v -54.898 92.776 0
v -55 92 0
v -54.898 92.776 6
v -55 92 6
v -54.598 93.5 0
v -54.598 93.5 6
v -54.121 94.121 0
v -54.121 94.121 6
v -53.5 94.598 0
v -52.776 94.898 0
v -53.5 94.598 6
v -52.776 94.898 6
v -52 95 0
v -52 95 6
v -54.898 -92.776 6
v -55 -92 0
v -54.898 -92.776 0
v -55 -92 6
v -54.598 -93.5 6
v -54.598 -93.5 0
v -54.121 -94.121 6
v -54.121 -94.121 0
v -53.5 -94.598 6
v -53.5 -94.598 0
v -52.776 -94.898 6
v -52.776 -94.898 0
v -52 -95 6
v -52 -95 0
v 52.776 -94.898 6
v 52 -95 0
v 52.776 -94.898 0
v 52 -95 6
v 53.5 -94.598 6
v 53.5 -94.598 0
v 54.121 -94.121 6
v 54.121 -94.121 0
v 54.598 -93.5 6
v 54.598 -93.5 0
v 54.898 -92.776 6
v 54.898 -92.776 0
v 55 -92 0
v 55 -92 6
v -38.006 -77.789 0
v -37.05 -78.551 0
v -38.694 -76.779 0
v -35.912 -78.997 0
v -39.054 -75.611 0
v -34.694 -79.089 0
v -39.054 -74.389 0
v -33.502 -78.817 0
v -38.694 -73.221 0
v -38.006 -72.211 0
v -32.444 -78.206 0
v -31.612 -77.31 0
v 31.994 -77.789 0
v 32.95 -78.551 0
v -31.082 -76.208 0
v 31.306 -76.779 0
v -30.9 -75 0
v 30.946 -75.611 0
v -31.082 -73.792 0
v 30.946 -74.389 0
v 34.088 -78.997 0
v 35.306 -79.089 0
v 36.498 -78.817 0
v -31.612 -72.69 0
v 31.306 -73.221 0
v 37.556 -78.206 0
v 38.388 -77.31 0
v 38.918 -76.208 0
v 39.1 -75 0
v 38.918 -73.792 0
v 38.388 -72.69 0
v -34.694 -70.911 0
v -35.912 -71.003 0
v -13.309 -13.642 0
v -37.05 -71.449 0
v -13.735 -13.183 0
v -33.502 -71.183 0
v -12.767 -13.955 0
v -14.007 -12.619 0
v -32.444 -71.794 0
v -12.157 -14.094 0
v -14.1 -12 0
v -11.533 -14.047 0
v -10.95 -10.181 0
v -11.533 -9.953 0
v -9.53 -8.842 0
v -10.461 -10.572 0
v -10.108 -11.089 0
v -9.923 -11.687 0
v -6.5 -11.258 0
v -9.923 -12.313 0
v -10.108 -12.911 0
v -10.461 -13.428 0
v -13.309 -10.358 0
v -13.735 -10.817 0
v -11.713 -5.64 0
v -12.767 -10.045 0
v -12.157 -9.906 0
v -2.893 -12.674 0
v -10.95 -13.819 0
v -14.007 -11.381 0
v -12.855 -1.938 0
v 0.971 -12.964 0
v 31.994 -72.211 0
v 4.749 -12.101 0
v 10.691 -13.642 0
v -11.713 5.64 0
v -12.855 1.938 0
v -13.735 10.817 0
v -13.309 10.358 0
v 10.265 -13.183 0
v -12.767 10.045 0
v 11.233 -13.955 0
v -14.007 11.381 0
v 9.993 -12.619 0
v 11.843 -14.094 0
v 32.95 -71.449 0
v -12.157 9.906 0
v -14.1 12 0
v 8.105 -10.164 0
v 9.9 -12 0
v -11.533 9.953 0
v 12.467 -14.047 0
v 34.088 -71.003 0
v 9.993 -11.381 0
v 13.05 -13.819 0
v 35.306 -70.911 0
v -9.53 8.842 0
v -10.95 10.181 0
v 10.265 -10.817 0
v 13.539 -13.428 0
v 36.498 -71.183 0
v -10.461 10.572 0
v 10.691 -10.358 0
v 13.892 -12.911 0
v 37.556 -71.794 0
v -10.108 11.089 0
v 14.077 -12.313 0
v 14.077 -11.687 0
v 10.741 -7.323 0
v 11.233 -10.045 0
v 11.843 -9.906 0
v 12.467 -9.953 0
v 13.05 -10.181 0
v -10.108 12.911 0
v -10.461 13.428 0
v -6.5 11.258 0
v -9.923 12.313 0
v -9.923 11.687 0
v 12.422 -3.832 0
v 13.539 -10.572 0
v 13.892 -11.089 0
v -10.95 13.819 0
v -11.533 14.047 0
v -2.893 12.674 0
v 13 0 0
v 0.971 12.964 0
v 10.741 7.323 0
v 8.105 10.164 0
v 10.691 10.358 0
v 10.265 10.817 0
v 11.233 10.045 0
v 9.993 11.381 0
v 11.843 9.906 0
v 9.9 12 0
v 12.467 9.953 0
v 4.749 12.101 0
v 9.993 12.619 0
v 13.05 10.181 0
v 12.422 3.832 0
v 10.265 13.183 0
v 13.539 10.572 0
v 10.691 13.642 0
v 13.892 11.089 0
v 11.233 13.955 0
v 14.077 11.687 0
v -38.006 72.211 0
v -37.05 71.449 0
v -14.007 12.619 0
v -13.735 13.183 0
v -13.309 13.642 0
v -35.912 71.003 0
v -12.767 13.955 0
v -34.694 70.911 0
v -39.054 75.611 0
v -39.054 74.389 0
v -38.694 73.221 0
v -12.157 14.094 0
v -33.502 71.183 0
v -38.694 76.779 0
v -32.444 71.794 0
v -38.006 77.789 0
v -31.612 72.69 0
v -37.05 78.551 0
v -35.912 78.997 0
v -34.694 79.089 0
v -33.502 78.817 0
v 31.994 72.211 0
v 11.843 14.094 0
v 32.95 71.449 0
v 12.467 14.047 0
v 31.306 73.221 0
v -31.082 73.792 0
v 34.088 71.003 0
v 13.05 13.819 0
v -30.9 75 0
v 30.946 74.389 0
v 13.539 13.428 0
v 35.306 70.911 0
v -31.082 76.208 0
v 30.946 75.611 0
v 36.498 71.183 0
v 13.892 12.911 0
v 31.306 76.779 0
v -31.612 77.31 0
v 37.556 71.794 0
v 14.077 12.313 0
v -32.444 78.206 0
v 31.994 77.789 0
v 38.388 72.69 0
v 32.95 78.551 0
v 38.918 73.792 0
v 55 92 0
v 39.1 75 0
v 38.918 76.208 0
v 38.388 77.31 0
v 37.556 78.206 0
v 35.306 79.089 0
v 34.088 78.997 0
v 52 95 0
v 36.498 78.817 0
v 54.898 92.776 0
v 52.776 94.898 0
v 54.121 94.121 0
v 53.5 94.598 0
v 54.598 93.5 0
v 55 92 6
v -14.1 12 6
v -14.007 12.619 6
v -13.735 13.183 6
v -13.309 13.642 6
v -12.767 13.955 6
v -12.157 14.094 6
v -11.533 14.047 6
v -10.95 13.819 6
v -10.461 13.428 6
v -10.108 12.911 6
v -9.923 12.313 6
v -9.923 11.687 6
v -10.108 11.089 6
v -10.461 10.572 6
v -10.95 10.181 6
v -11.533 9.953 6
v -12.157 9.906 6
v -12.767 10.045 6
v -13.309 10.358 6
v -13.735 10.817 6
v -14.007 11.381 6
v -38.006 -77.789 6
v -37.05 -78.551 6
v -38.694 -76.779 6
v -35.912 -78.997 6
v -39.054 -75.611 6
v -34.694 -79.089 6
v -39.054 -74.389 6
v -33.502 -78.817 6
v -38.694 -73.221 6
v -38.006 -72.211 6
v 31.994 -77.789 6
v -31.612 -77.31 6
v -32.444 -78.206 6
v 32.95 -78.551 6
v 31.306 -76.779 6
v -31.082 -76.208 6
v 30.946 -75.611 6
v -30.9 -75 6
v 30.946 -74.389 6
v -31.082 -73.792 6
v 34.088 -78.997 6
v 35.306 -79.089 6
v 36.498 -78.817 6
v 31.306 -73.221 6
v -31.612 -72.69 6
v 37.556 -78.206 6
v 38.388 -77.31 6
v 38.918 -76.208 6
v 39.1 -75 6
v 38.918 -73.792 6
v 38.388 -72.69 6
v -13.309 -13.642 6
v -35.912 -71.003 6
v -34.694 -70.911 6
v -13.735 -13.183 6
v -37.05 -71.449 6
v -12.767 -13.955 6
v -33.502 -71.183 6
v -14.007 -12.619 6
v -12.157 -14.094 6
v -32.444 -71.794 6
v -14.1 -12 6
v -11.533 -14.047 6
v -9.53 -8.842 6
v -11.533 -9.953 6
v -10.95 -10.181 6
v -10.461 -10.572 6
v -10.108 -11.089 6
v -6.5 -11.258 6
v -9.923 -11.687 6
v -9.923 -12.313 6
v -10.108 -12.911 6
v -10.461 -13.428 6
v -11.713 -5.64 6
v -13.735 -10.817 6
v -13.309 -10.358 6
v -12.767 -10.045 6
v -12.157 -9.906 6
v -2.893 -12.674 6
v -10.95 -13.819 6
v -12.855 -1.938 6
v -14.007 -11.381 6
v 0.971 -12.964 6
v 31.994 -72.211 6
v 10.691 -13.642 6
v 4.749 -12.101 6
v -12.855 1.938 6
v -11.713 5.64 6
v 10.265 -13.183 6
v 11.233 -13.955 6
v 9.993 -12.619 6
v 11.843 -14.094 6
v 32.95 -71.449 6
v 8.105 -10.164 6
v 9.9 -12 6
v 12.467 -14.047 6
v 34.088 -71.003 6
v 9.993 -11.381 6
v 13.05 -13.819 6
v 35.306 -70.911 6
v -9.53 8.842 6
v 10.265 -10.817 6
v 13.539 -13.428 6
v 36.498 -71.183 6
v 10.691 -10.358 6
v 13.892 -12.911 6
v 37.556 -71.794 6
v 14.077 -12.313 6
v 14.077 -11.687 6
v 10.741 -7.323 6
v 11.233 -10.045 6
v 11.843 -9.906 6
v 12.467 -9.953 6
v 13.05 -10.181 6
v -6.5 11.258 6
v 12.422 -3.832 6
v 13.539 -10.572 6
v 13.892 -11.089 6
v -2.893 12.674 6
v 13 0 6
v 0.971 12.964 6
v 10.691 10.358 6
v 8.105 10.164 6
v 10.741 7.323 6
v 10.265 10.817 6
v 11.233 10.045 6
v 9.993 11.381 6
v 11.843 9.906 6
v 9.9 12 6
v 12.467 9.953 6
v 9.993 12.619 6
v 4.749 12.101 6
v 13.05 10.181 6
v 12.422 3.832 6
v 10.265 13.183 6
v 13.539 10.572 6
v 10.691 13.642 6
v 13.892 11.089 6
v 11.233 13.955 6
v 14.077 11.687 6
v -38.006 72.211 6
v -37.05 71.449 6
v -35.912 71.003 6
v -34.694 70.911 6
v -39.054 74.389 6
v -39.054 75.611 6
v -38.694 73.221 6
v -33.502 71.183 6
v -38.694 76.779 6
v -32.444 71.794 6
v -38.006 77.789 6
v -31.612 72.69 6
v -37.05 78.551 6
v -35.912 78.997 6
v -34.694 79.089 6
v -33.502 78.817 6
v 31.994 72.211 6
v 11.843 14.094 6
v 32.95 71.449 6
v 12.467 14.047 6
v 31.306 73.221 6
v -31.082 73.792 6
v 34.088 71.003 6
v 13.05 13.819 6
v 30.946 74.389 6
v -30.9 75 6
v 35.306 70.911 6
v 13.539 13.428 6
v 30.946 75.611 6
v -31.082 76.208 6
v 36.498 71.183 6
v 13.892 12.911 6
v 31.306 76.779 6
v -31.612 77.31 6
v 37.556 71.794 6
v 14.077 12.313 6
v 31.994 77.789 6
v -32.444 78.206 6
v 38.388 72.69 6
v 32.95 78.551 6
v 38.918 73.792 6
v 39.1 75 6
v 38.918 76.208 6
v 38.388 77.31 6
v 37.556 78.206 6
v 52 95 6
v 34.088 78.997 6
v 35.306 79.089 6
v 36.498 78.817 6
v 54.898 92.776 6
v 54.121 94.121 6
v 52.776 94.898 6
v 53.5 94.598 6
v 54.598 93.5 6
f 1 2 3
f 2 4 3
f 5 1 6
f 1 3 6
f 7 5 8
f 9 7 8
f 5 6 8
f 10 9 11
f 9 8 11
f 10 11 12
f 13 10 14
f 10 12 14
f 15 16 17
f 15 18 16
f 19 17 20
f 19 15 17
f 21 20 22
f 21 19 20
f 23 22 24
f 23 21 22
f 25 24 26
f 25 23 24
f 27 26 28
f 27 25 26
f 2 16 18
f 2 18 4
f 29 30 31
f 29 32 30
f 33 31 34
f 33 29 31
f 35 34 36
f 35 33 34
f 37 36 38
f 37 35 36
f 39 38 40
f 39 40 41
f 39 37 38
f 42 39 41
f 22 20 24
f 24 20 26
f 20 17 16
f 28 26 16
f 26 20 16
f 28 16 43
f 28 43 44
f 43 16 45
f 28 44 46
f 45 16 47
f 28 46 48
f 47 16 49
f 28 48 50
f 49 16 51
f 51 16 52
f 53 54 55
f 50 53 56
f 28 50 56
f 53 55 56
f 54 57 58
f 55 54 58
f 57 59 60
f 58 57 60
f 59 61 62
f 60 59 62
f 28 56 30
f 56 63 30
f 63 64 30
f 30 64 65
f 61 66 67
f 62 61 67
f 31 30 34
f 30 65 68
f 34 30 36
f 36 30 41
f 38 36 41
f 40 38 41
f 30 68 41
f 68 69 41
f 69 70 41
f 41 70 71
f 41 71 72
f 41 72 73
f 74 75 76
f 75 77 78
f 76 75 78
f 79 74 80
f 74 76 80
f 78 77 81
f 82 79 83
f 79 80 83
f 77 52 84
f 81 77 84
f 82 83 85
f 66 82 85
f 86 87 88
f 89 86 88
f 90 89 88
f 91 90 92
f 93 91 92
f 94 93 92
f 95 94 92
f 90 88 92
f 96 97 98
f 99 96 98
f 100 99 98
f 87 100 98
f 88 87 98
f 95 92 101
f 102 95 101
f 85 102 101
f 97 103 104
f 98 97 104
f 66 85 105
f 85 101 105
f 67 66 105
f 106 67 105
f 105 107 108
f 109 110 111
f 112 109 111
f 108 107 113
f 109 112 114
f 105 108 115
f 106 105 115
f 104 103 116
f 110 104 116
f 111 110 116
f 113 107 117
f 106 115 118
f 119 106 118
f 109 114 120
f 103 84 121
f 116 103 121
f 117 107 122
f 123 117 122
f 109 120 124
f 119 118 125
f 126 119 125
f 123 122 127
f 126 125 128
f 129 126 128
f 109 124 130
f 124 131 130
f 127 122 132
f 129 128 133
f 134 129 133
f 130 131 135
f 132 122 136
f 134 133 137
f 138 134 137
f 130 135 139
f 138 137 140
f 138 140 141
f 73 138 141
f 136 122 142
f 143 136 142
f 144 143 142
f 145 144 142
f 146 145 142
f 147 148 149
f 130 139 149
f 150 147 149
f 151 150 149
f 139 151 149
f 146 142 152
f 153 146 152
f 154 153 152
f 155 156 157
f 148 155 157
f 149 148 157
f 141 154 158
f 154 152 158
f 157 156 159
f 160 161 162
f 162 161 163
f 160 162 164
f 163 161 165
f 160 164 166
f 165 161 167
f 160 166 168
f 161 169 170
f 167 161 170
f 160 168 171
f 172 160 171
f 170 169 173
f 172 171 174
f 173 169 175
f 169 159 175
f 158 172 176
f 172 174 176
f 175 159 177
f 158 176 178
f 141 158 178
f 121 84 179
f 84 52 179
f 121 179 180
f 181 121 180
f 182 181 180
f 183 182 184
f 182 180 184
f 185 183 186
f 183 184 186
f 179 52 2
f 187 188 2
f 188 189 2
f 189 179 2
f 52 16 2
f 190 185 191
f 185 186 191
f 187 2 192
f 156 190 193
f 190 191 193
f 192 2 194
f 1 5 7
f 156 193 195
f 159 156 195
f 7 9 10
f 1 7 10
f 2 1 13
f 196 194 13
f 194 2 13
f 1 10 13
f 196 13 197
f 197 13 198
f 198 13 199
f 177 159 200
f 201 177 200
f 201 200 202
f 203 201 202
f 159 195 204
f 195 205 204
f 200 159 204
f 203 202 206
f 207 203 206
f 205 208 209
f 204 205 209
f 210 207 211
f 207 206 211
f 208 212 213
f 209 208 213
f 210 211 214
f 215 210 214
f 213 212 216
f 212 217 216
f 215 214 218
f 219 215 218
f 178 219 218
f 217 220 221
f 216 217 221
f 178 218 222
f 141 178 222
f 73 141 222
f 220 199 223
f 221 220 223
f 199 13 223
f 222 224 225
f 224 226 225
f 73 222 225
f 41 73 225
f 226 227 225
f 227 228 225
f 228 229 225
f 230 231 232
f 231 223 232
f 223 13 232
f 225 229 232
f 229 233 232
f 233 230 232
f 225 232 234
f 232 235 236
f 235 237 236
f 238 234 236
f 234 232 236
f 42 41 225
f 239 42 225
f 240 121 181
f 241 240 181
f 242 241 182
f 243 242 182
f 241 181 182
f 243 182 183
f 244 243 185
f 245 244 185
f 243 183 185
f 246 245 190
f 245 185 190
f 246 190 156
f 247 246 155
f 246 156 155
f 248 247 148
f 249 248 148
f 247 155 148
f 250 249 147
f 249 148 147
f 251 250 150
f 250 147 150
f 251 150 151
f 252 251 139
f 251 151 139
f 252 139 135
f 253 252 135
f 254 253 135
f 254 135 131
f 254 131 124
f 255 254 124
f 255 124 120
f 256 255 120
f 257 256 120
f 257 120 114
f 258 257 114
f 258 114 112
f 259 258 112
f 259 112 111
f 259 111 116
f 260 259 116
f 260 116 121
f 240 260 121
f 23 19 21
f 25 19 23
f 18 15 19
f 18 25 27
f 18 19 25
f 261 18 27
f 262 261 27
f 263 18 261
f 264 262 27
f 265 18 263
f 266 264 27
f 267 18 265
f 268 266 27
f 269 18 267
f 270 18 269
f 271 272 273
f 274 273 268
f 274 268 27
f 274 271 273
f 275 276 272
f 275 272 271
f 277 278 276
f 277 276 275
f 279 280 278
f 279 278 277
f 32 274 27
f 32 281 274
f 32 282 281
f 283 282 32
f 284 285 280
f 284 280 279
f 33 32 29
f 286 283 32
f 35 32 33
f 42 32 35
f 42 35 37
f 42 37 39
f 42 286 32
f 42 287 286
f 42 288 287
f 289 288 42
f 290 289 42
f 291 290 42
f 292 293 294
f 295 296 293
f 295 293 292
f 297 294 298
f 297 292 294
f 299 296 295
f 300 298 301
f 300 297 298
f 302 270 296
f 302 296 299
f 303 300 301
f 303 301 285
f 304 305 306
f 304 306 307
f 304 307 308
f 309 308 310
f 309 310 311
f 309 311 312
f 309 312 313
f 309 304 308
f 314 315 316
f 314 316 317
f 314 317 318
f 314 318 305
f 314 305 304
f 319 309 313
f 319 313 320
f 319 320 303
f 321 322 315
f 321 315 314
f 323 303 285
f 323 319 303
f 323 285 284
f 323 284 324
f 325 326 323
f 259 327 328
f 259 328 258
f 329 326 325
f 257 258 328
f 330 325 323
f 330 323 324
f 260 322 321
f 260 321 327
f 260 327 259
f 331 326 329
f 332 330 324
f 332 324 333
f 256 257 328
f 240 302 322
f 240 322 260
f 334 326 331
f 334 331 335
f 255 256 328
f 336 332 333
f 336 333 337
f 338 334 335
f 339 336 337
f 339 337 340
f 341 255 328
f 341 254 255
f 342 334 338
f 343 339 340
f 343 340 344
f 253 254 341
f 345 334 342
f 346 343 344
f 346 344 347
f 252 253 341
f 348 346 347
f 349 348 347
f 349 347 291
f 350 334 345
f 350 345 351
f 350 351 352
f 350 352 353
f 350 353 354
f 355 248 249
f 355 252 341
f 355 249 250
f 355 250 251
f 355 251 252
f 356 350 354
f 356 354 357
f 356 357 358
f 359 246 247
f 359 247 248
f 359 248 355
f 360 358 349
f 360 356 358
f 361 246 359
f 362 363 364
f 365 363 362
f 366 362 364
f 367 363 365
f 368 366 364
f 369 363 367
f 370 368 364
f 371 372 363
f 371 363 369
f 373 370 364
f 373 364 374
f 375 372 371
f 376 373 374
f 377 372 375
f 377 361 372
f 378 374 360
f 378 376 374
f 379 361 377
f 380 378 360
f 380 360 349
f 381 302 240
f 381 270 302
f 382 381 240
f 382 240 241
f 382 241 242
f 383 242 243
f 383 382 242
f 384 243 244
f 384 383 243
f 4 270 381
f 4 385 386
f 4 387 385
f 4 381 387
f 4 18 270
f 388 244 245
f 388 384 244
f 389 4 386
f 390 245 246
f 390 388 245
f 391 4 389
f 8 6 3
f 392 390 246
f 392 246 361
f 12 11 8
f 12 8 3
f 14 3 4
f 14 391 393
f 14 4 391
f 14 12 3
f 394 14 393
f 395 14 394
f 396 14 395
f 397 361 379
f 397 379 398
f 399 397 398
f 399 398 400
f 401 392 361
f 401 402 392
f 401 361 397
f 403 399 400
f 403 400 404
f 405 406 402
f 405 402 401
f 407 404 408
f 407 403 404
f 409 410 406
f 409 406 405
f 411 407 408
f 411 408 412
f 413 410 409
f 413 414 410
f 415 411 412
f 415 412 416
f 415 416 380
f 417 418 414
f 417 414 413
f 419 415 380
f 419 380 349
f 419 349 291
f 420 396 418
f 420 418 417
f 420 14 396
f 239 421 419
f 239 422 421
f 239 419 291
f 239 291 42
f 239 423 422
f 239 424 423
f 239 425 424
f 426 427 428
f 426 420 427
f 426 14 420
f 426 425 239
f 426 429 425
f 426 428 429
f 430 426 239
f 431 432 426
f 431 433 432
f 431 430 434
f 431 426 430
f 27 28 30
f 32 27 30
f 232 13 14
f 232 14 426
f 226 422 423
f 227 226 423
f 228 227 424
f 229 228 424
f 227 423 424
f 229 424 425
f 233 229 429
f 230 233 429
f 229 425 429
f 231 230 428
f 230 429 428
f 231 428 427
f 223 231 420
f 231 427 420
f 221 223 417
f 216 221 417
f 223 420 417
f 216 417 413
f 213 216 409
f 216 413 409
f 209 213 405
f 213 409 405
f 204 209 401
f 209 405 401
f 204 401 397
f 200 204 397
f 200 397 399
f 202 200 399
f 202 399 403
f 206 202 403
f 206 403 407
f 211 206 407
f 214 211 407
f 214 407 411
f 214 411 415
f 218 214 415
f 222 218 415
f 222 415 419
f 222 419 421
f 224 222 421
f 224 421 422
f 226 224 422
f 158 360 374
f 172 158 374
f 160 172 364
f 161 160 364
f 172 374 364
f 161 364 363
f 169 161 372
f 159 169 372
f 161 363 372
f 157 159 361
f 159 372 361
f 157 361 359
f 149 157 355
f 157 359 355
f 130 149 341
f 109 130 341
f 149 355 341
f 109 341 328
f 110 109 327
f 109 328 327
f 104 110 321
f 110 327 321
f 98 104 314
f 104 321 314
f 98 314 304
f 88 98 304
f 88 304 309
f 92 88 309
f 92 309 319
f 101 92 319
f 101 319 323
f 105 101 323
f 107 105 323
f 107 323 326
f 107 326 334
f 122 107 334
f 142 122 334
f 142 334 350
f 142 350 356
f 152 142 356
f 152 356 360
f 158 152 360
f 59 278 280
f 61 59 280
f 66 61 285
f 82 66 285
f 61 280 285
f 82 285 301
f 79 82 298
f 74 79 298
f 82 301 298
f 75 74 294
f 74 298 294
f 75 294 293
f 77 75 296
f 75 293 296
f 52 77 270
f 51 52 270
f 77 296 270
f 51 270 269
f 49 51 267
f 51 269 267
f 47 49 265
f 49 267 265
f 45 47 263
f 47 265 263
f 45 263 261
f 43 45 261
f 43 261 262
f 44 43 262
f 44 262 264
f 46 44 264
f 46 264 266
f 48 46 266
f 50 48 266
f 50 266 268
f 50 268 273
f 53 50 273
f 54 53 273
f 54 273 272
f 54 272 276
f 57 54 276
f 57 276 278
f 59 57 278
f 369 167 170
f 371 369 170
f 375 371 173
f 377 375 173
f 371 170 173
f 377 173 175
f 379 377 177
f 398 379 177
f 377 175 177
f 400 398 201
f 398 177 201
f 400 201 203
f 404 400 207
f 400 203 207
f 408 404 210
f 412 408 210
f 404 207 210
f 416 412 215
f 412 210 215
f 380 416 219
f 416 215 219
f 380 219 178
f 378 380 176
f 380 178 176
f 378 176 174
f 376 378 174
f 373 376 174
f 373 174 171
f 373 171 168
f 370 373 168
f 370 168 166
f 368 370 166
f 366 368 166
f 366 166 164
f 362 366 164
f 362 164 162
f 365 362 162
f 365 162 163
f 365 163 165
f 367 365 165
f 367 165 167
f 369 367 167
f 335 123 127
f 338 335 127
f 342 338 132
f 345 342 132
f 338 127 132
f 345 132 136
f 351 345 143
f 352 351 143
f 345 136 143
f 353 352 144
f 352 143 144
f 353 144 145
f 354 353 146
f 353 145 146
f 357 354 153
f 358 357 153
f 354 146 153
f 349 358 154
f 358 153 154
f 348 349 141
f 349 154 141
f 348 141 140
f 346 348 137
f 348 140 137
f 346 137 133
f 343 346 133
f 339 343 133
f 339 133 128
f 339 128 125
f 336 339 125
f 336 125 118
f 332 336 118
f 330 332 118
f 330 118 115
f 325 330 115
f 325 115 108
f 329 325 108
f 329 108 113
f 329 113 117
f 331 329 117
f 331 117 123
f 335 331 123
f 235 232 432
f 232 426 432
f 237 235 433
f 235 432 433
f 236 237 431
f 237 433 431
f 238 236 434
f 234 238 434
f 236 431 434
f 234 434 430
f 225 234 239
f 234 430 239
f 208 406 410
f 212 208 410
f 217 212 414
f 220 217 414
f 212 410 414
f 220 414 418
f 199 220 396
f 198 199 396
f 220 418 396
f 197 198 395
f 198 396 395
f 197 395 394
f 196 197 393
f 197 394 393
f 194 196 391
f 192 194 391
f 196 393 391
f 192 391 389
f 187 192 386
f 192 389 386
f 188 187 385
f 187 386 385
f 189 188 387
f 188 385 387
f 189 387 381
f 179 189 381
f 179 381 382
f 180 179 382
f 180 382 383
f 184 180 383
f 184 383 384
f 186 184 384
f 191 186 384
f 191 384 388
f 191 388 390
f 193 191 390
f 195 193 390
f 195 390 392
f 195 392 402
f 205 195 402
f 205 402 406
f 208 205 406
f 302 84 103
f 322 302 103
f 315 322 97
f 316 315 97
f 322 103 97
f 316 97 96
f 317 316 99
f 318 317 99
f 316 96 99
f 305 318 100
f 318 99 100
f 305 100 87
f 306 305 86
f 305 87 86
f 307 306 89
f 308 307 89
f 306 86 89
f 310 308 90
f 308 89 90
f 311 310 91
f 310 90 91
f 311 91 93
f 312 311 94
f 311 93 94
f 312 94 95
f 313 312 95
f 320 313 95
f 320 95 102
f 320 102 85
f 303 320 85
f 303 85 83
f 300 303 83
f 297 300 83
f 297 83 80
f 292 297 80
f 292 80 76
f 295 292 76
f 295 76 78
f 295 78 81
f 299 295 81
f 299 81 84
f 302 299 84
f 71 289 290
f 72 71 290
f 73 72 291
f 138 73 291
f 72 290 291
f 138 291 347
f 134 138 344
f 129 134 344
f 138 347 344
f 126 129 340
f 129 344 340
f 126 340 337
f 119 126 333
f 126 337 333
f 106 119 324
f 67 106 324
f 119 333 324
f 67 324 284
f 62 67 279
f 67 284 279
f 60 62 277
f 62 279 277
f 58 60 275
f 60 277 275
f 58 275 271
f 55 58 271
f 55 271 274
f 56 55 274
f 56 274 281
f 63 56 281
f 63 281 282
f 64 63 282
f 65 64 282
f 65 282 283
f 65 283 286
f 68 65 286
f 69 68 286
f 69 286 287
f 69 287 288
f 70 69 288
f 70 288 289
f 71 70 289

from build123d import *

# Parameters (mm, degrees)
SKETCH1_W                = 110
SKETCH1_H                = 190
BOSS_EXTRUDE1_DEPTH      = 6
CUT_EXTRUDE1_REACH       = 111.936
SKETCH2_R                = 13
CUT_EXTRUDE2_REACH       = 111.936
SKETCH3_R                = 4.1
FILLET1_R                = 3
M4_CLEARANCE_HOLE1_D     = 4.2
M4_CLEARANCE_HOLE1_DEPTH = 19.75
M4_CLEARANCE_HOLE1_TIP   = 1.2618073


with BuildPart() as part:
    # Sketch1 → Boss-Extrude1 (new body)
    with BuildSketch(Plane.XY):
        Rectangle(SKETCH1_W, SKETCH1_H)
    extrude(amount=BOSS_EXTRUDE1_DEPTH)

    # Sketch2 → Cut-Extrude1 (cut, up to next)
    with BuildSketch(Plane.XY.offset(6), mode=Mode.PRIVATE) as cut_extrude1_sk1:
        Circle(SKETCH2_R)
    cut_extrude1_tool1 = extrude(cut_extrude1_sk1.sketch, amount=-CUT_EXTRUDE1_REACH, mode=Mode.PRIVATE) & part.part
    add(cut_extrude1_tool1.solids().sort_by_distance((0, 0, 6))[0], mode=Mode.SUBTRACT)

    # Sketch3 → Cut-Extrude2 (cut, up to next)
    with BuildSketch(Plane.XY.offset(6), mode=Mode.PRIVATE) as cut_extrude2_sk1:
        with Locations((-35, 75)):
            Circle(SKETCH3_R)
    cut_extrude2_tool1 = extrude(cut_extrude2_sk1.sketch, amount=-CUT_EXTRUDE2_REACH, mode=Mode.PRIVATE) & part.part
    # Sketch3 → Cut-Extrude2 (cut, up to next)
    with BuildSketch(Plane.XY.offset(6), mode=Mode.PRIVATE) as cut_extrude2_sk2:
        with Locations((35, 75)):
            Circle(SKETCH3_R)
    cut_extrude2_tool2 = extrude(cut_extrude2_sk2.sketch, amount=-CUT_EXTRUDE2_REACH, mode=Mode.PRIVATE) & part.part
    # Sketch3 → Cut-Extrude2 (cut, up to next)
    with BuildSketch(Plane.XY.offset(6), mode=Mode.PRIVATE) as cut_extrude2_sk3:
        with Locations((35, -75)):
            Circle(SKETCH3_R)
    cut_extrude2_tool3 = extrude(cut_extrude2_sk3.sketch, amount=-CUT_EXTRUDE2_REACH, mode=Mode.PRIVATE) & part.part
    # Sketch3 → Cut-Extrude2 (cut, up to next)
    with BuildSketch(Plane.XY.offset(6), mode=Mode.PRIVATE) as cut_extrude2_sk4:
        with Locations((-35, -75)):
            Circle(SKETCH3_R)
    cut_extrude2_tool4 = extrude(cut_extrude2_sk4.sketch, amount=-CUT_EXTRUDE2_REACH, mode=Mode.PRIVATE) & part.part
    add(cut_extrude2_tool1.solids().sort_by_distance((-35, 75, 6))[0], mode=Mode.SUBTRACT)
    add(cut_extrude2_tool2.solids().sort_by_distance((35, 75, 6))[0], mode=Mode.SUBTRACT)
    add(cut_extrude2_tool3.solids().sort_by_distance((35, -75, 6))[0], mode=Mode.SUBTRACT)
    add(cut_extrude2_tool4.solids().sort_by_distance((-35, -75, 6))[0], mode=Mode.SUBTRACT)

    # Fillet1
    fillet1_edges = [part.edges().sort_by_distance(p)[0] for p in [
        (55, -95, 3),
        (-55, -95, 3),
        (-55, 95, 3),
        (55, 95, 3),
    ]]
    fillet(fillet1_edges, radius=FILLET1_R)

    # M4 Clearance Hole1
    with Locations(Plane(origin=(-12, 12, 6), x_dir=(1, 0, 0), z_dir=(0, 0, 1))):
        with Locations((0, 0), (24, 0), (24, -24), (0, -24)):
            Hole(M4_CLEARANCE_HOLE1_D / 2, depth=M4_CLEARANCE_HOLE1_DEPTH)
            with Locations((0, 0, -(M4_CLEARANCE_HOLE1_DEPTH + M4_CLEARANCE_HOLE1_TIP / 2))):  # 118° drill point
                Cone(0, M4_CLEARANCE_HOLE1_D / 2, M4_CLEARANCE_HOLE1_TIP, mode=Mode.SUBTRACT)


solid = part.part
